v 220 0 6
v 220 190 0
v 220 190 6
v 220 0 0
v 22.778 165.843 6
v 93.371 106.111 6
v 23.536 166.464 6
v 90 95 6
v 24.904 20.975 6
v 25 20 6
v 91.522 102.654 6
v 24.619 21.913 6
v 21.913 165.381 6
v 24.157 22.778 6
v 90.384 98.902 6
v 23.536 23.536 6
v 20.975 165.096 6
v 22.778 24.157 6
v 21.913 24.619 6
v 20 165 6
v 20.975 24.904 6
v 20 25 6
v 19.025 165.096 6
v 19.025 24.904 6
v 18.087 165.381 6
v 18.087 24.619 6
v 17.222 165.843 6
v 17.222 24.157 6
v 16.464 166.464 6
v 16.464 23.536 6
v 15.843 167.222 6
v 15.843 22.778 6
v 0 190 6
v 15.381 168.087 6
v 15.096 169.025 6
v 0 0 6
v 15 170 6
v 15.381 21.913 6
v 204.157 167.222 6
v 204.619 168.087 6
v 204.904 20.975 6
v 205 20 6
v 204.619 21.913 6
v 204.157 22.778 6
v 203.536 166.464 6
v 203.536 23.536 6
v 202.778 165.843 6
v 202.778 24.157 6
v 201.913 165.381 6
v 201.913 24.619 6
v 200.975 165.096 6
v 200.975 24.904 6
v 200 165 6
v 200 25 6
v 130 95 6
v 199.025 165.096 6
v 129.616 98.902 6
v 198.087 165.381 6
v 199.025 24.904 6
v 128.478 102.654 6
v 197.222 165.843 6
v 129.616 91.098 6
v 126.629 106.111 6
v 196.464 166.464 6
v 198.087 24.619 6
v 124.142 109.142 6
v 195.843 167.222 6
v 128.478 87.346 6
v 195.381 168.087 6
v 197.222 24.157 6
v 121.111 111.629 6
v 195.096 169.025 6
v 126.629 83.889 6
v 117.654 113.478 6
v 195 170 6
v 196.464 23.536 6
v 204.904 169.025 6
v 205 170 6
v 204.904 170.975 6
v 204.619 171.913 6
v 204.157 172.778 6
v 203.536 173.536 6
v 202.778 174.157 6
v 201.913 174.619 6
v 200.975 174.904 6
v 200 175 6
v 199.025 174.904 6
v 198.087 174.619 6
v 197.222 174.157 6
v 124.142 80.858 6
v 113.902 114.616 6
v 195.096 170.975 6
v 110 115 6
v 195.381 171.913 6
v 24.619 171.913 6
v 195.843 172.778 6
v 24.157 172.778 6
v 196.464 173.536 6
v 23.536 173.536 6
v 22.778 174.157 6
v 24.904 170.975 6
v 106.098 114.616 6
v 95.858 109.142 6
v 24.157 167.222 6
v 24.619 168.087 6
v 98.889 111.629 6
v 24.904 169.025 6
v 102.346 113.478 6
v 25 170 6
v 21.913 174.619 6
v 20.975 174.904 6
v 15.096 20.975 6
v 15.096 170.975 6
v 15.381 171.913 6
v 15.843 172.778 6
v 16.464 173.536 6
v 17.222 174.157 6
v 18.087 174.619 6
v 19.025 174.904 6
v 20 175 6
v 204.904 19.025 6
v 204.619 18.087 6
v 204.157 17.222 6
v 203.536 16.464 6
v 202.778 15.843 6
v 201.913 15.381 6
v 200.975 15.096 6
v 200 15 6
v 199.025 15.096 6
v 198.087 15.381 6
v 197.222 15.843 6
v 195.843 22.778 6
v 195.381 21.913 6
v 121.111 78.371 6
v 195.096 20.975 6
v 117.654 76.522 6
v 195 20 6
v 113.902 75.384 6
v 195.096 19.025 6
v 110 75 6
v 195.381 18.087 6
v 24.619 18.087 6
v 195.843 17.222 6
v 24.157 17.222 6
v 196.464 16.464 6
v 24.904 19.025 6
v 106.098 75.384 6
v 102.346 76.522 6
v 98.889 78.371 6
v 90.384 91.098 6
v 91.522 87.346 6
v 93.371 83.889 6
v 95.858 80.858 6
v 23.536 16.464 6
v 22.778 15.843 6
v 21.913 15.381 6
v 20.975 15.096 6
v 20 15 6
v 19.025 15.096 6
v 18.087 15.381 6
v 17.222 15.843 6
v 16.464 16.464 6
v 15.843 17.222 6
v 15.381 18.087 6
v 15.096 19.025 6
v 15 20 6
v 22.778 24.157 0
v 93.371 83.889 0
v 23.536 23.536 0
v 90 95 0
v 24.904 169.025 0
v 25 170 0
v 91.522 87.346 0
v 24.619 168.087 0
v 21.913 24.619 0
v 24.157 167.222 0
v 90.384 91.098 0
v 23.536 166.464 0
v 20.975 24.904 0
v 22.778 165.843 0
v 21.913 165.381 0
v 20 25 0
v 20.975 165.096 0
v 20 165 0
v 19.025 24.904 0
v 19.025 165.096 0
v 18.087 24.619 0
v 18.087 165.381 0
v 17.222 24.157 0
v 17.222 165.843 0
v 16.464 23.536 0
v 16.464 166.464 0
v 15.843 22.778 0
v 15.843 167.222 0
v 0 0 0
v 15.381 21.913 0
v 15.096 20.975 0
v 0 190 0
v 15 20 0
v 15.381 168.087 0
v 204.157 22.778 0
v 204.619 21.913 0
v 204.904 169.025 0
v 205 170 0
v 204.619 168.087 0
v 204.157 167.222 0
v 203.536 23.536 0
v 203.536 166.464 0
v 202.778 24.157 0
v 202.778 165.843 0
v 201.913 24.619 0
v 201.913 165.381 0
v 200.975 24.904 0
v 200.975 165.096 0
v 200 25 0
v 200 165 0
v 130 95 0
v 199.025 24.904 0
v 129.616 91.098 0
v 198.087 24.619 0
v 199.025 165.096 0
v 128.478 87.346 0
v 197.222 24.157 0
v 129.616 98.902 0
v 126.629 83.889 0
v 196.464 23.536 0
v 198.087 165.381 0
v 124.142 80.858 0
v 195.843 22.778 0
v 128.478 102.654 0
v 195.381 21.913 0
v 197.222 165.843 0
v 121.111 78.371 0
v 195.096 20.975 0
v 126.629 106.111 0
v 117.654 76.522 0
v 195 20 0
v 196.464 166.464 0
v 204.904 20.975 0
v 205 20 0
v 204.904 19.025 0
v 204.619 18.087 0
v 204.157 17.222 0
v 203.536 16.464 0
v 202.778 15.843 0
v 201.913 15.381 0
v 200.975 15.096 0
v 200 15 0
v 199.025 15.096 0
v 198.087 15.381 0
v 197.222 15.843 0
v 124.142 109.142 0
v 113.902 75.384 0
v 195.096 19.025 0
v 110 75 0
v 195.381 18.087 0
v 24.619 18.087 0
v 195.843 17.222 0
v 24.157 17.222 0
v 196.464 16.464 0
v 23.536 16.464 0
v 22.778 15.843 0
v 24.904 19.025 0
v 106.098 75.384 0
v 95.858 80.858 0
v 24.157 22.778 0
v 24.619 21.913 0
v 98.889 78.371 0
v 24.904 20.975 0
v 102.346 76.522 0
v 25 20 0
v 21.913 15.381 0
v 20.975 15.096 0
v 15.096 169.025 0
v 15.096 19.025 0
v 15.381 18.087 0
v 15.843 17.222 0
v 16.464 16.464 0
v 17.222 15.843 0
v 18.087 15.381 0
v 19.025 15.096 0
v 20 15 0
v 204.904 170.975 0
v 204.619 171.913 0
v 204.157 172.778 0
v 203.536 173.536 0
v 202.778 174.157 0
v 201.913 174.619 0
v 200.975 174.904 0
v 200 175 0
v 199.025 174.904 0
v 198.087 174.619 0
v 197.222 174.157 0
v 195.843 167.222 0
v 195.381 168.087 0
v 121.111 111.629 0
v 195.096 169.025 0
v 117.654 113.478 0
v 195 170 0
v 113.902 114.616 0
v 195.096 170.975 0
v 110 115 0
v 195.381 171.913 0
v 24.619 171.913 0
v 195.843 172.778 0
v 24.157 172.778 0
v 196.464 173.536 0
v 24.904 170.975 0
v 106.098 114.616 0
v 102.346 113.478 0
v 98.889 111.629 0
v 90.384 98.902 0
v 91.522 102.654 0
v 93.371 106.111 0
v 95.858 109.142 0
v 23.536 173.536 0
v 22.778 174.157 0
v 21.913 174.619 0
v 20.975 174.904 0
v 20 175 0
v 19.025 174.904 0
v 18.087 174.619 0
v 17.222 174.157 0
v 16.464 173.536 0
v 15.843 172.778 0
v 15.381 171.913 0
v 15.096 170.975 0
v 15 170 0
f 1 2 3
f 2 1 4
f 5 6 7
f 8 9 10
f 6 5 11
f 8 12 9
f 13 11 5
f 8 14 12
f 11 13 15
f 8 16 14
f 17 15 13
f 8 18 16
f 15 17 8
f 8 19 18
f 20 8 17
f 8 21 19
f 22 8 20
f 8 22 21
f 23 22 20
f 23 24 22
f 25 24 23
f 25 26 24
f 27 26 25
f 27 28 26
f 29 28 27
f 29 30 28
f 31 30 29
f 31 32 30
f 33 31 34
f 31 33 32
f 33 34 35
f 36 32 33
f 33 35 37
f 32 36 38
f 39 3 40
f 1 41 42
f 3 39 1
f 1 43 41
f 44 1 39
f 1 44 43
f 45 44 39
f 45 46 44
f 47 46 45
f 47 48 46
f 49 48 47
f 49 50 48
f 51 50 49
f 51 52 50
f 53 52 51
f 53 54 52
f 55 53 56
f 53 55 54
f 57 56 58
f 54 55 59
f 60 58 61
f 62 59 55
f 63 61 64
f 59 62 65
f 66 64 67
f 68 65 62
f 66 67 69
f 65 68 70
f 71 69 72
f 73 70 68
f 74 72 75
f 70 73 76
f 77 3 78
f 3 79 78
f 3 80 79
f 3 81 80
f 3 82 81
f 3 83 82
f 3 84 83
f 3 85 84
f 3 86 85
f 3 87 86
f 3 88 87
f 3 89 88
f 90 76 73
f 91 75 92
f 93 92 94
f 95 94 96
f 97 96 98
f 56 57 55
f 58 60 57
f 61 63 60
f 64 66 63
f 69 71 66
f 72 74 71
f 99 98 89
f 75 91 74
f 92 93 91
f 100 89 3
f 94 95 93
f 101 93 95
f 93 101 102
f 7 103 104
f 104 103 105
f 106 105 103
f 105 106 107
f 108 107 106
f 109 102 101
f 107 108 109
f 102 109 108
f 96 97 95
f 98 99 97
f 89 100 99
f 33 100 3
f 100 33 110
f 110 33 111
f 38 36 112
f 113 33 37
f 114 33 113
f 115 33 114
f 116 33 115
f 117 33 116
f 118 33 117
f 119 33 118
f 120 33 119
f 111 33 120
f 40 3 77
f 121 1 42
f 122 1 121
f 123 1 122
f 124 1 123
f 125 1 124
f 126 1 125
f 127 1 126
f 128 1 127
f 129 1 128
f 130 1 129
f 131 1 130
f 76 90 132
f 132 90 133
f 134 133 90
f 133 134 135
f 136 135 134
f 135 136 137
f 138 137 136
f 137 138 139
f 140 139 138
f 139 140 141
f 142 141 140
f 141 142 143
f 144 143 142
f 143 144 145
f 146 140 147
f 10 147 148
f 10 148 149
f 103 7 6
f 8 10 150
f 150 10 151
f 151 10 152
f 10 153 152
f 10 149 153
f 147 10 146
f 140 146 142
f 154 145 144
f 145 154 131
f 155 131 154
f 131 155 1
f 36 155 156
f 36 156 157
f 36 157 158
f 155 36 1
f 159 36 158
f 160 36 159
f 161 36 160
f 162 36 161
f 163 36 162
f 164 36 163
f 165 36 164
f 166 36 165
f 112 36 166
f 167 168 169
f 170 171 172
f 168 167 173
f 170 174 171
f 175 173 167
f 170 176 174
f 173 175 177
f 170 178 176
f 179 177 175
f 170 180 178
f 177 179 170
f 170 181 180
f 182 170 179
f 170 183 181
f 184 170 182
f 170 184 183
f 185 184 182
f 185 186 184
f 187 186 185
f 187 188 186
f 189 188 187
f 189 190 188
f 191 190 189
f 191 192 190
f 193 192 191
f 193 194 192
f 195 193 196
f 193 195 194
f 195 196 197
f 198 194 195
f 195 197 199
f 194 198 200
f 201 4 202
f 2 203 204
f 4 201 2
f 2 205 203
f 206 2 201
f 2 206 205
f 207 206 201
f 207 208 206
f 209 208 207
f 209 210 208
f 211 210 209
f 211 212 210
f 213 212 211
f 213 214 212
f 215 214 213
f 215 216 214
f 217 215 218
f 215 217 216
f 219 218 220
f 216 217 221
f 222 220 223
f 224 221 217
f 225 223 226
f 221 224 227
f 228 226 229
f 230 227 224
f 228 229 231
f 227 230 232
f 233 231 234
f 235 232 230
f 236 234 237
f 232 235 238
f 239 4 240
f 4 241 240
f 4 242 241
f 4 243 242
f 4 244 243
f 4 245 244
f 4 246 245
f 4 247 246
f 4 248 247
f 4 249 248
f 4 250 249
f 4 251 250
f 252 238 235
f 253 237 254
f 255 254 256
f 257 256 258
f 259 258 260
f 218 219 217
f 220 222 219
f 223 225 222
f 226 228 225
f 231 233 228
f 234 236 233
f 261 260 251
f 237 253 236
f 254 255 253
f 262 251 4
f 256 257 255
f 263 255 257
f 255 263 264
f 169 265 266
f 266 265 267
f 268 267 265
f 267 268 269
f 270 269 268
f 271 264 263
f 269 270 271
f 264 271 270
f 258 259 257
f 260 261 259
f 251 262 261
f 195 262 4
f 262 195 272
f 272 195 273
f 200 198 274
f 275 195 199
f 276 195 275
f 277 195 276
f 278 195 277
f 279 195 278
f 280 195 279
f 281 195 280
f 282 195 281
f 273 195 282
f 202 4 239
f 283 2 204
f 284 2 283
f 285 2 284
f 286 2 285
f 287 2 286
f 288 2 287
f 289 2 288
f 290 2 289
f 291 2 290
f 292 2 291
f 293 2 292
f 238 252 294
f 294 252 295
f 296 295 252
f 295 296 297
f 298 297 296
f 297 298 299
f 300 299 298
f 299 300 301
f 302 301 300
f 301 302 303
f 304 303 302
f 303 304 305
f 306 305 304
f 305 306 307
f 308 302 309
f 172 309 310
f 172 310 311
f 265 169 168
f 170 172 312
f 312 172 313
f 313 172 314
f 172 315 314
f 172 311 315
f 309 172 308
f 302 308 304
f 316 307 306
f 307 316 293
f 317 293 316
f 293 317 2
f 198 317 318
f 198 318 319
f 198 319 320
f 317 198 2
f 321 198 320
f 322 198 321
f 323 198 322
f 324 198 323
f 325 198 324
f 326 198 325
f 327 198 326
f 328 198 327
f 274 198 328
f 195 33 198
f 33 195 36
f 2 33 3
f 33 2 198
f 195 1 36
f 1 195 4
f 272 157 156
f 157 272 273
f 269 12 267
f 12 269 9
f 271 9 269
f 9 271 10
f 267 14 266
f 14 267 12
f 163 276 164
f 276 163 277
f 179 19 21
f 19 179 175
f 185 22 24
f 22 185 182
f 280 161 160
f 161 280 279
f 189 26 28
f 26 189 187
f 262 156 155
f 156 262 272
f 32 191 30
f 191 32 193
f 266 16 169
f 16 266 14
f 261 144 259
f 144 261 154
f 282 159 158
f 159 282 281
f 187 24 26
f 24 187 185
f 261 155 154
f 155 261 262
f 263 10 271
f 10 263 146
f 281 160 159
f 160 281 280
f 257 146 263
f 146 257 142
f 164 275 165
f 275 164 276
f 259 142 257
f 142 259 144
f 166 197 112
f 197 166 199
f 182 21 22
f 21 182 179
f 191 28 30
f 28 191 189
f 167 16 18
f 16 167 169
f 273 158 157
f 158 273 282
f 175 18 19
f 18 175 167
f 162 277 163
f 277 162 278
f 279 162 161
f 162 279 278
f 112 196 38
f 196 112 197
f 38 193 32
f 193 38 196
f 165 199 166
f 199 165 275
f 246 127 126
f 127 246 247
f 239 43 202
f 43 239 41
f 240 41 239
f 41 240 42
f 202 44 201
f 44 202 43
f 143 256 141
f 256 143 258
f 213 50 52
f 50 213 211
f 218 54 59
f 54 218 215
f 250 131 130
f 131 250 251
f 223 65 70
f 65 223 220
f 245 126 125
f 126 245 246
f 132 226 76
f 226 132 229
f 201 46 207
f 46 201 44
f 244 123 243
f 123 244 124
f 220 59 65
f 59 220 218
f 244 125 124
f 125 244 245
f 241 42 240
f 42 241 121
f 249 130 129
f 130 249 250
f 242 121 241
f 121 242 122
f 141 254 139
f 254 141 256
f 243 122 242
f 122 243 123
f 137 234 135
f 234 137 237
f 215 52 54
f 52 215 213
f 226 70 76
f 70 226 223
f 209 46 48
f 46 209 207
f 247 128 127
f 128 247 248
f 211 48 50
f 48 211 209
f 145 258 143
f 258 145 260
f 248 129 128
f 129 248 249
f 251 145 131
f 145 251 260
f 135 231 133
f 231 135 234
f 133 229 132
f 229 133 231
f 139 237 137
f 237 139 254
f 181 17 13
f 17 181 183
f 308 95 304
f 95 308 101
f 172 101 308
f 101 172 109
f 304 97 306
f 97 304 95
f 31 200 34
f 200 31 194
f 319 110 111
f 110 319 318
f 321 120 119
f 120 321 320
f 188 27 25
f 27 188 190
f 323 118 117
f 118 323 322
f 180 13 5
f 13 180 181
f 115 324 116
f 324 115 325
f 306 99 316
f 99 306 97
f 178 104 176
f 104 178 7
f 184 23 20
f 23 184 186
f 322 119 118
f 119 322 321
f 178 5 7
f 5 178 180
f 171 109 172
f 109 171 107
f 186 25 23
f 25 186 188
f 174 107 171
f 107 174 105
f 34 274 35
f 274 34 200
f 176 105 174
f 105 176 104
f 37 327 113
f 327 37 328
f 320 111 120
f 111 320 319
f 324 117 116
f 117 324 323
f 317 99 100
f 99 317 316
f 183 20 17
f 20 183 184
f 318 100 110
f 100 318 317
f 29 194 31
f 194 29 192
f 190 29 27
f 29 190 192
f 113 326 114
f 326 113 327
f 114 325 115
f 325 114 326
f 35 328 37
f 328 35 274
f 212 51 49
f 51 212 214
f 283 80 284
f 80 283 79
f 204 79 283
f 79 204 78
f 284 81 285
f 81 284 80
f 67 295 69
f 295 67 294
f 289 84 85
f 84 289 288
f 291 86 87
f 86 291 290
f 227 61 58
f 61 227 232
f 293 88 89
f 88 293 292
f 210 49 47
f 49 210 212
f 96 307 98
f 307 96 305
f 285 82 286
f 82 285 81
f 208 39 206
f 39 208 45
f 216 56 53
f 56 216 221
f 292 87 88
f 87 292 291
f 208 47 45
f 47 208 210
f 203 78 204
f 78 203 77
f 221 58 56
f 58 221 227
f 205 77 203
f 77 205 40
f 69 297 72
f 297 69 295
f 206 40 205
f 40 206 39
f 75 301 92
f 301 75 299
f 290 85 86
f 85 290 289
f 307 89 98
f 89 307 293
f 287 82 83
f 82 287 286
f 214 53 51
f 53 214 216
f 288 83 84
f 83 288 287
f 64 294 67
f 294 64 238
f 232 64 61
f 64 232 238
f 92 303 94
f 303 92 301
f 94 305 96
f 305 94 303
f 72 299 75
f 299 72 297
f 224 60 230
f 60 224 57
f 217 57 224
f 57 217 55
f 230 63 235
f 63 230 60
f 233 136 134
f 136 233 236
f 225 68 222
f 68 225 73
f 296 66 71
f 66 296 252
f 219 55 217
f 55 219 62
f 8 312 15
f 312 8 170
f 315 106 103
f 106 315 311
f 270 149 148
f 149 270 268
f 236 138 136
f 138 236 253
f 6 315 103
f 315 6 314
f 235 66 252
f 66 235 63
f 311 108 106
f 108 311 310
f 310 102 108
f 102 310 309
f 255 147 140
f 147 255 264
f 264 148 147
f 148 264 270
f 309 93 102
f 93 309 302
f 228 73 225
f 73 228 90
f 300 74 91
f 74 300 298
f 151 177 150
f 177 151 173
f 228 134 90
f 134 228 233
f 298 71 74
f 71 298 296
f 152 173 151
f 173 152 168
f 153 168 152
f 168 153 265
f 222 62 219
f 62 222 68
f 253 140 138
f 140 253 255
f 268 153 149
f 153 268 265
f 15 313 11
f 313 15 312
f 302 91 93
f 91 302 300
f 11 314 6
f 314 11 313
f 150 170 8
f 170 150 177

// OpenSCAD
$fn = 32;

// ----------------------------------------------------------------------
// Big plate: 200-250 mm adapter plate
// ----------------------------------------------------------------------

// --- parameters (mm) ---
plate_l = 220;            // plate length, X
plate_w = 190;            // plate width, Y
plate_t = 6;              // plate thickness, Z
corner_d = 10;            // corner hole diameter
corner_in = 20;           // corner hole inset from the edges
bore_d = 40;              // central bore

difference() {
  cube([plate_l, plate_w, plate_t]);
  translate([corner_in, corner_in, -1]) cylinder(h = plate_t + 2, d = corner_d);
  translate([plate_l - corner_in, corner_in, -1]) cylinder(h = plate_t + 2, d = corner_d);
  translate([corner_in, plate_w - corner_in, -1]) cylinder(h = plate_t + 2, d = corner_d);
  translate([plate_l - corner_in, plate_w - corner_in, -1]) cylinder(h = plate_t + 2, d = corner_d);
  translate([plate_l / 2, plate_w / 2, -1]) cylinder(h = plate_t + 2, d = bore_d);
}
